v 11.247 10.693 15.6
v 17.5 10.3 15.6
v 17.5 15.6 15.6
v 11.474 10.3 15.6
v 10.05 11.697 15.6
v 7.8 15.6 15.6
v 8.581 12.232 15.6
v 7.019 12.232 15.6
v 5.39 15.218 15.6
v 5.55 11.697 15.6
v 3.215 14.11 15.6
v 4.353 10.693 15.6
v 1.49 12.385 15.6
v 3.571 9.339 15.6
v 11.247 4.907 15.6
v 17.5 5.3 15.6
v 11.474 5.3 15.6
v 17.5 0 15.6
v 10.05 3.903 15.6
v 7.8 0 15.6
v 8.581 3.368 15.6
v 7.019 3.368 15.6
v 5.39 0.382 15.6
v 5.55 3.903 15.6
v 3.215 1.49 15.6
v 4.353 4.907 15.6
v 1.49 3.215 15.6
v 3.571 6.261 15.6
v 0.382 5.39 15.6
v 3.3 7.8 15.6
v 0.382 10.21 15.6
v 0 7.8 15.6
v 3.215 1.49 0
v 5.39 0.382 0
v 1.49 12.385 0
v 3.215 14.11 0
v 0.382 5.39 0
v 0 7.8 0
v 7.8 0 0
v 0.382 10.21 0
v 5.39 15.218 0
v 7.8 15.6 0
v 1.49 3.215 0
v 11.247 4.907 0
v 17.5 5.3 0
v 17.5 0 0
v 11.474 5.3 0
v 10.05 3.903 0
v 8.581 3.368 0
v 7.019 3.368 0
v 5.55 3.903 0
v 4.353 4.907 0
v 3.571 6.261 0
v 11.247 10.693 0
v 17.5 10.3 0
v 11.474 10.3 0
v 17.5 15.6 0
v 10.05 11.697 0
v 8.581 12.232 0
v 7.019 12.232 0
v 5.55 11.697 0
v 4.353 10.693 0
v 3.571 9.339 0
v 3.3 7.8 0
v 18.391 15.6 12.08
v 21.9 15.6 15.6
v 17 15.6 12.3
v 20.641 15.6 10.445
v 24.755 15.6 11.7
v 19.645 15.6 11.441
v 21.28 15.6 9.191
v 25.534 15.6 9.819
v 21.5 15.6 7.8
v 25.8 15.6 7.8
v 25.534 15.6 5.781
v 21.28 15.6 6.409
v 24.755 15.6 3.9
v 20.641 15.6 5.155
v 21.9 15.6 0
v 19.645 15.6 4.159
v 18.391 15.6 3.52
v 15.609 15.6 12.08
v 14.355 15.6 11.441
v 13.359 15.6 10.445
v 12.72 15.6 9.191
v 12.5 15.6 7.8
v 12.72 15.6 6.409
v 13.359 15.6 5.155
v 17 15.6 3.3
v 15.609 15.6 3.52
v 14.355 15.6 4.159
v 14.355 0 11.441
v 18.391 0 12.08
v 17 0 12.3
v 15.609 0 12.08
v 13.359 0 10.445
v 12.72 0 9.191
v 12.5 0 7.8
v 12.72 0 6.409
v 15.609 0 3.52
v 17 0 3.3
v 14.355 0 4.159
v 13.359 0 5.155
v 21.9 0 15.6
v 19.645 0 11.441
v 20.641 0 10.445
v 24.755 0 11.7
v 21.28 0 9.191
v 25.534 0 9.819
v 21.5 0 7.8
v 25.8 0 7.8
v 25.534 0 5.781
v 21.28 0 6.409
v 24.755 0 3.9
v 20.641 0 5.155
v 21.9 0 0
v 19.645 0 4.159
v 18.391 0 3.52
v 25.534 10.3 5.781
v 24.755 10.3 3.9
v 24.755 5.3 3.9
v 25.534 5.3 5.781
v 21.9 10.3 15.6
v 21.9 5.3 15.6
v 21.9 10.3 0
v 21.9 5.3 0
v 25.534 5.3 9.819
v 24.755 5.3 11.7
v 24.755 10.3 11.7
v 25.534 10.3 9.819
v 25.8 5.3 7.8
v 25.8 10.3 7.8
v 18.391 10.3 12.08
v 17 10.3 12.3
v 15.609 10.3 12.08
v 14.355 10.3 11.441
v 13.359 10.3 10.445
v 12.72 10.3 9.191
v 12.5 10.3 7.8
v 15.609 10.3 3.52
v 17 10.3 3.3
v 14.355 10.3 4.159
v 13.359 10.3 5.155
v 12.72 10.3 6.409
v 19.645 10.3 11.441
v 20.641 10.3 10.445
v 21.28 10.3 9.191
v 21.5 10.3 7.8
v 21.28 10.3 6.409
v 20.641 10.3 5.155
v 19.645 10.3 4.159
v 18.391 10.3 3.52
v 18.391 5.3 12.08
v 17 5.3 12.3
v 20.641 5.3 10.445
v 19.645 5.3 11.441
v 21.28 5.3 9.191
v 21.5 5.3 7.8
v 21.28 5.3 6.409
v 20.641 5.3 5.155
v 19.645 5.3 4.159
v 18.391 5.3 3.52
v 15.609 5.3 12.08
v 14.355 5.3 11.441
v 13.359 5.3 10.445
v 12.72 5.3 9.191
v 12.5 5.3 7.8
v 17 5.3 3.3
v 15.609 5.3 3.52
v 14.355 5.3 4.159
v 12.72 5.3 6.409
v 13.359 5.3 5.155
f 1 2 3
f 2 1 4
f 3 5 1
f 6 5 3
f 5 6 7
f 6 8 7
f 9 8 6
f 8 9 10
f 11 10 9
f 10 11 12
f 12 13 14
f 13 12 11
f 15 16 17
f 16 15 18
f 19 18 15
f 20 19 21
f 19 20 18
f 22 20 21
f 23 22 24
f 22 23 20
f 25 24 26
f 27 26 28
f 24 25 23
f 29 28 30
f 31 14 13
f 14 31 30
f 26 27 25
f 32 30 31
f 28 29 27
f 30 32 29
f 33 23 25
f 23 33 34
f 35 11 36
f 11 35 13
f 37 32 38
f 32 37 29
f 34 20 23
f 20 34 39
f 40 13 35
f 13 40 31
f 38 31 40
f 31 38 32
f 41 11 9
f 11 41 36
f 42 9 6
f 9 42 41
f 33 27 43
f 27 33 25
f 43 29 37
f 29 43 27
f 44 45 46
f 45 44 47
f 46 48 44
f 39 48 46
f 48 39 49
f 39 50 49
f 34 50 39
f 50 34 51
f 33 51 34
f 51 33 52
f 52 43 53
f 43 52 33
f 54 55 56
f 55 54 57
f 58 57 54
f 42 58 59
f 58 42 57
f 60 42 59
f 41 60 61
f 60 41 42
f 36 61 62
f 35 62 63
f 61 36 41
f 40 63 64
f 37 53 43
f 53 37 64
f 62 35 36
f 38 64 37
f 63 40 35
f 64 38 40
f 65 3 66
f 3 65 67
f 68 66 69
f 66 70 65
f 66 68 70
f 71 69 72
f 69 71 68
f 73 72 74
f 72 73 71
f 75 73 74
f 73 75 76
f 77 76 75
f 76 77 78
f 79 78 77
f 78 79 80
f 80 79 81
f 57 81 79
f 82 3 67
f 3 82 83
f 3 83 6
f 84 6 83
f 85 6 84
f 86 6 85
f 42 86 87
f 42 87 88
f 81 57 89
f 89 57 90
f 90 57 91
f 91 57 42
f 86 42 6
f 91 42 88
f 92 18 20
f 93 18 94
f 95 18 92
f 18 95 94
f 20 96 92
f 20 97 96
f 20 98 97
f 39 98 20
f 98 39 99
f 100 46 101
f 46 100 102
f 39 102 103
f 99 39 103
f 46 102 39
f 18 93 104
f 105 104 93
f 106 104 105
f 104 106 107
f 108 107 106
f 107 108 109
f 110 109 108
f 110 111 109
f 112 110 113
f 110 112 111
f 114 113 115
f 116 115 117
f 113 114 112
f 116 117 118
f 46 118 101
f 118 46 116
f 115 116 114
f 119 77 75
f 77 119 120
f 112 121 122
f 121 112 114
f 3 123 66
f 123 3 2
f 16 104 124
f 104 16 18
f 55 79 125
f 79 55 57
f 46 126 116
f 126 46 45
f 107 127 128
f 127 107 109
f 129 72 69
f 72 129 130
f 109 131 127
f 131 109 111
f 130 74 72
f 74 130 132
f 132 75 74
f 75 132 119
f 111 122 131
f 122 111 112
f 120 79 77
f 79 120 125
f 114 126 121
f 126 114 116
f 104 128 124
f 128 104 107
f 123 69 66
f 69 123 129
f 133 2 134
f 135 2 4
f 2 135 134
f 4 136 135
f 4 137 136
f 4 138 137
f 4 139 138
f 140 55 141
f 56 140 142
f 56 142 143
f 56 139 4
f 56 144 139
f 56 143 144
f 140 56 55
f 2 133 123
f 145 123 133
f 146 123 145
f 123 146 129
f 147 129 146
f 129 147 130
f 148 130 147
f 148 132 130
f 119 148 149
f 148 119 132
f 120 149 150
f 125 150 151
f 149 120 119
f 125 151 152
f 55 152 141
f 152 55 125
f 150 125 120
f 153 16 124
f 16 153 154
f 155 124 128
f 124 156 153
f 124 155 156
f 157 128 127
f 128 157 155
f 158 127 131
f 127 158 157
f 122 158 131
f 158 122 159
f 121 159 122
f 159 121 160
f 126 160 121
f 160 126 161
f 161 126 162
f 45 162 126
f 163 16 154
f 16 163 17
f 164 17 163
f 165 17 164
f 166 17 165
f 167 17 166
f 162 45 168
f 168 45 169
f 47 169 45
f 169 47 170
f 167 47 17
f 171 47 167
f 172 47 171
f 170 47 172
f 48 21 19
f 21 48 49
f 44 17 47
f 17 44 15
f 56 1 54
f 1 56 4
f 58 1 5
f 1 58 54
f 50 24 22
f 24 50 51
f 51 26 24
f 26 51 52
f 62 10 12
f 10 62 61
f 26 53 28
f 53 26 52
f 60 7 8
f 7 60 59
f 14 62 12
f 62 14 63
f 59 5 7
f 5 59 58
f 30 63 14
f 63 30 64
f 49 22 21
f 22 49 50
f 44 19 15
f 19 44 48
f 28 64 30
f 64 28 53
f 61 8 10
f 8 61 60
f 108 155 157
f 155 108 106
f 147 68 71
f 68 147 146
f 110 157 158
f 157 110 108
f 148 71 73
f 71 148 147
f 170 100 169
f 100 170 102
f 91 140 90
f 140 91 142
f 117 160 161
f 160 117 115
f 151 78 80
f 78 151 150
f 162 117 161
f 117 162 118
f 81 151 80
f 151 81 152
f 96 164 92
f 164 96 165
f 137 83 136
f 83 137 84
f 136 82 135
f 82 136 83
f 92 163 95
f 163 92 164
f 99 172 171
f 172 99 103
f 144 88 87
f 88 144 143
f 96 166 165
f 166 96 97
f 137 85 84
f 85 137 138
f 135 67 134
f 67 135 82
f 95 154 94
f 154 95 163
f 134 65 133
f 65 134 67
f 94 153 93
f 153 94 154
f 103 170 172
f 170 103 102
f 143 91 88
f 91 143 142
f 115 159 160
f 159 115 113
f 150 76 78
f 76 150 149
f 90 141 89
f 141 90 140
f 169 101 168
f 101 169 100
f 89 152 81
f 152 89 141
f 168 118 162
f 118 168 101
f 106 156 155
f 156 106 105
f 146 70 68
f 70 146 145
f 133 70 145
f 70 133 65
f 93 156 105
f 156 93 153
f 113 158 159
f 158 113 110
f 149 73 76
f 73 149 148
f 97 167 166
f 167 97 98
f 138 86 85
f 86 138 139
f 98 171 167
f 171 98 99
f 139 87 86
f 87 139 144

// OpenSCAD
// file: functions.scad
// PRUSA Mendel  
// Functions used in many files
// GNU GPL v3
// Josef Průša
// josefprusa@me.com
// prusadjs.cz
// http://www.reprap.org/wiki/Prusa_Mendel
// http://github.com/prusajr/PrusaMendel


module nut(d,h,horizontal=true){
cornerdiameter =  (d / 2) / cos (180 / 6);
cylinder(h = h, r = cornerdiameter, $fn = 6);
if(horizontal){
for(i = [1:6]){
	rotate([0,0,60*i]) translate([-cornerdiameter-0.2,0,0]) rotate([0,0,-45]) cube(size = [2,2,h]);
}}
}

// Based on nophead research
module polyhole(d,h) {
    n = max(round(2 * d),3);
    rotate([0,0,180])
        cylinder(h = h, r = (d / 2) / cos (180 / n), $fn = n);
}




module roundcorner(diameter){
	difference(){
		cube(size = [diameter,diameter,99], center = false);
		translate(v = [diameter, diameter, 0]) cylinder(h = 100, r=diameter, center=true);
	}
}
// file: metric.scad
// PRUSA Mendel  
// Default metric sizes
// GNU GPL v3
// Josef Průša
// josefprusa@me.com
// prusadjs.cz
// http://www.reprap.org/wiki/Prusa_Mendel
// http://github.com/prusajr/PrusaMendel

// DONT CHANGE THIS FILE! ALTER VALUES IN CONFIGURATION.SCAD INSTEAD

// RODS

threaded_rod_diameter = 8.7;
threaded_rod_diameter_horizontal = 8.7;
smooth_bar_diameter = 8;
smooth_bar_diameter_horizontal = 8.5;

// Nuts and bolts

m8_diameter = 9;
m8_nut_diameter = 14.1;

m4_diameter = 4.5;
m4_nut_diameter = 9;

m3_diameter = 3.6;
m3_nut_diameter = 5.3;
m3_nut_diameter_horizontal = 6.1;

// Bushing holder

bushing_core_diameter = smooth_bar_diameter;
bushing_material_thickness = 1;

// Motors

motor_shaft = 5.5;
// file: teardrop.scad
teardrop();

module teardrop (r=4.5,h=20,top_and_bottom=false)
{
	rotate([-270,0,90])
	linear_extrude(height=h,convexity=10)
	{
		circle(r=r, $fn = 24);
		polygon(points=[[0,0],[r*cos(30),r*sin(30)],[0.5*r,r],[-0.5*r,r],[-r*cos(30),r*sin(30)]],
				paths=[[0,1,2,3,4]]);
		if (top_and_bottom)
		polygon(points=[[0,0],[r*cos(30),-r*sin(30)],[0.5*r,-r],[-0.5*r,-r],[-r*cos(30),-r*sin(30)]],
				paths=[[0,1,2,3,4]]);
		
	}
}

module teardropcentering (r=4.5,h=20)
{
	rotate([-270,0,90])
	linear_extrude(height=h)
	{
		circle(r=r, $fn = 24);
		polygon(points=[[0,0],[r*cos(30),r*sin(30)],[0.5*r,1.2*r],[-0.5*r,1.2*r],[-r*cos(30),r*sin(30)]],
				paths=[[0,1,2,3,4]]);
	}
}

module teardropcentering2 (r=4.5,h=20)
{
	//rotate([-270,0,90])
	difference(){
	linear_extrude(height=h)
	{
		circle(r=r, $fn = 24);
		polygon(points=[[0,0],[r*cos(30),r*sin(30)],[0.5*r,1.2*r],[-0.5*r,1.2*r],[-r*cos(30),r*sin(30)]],
				paths=[[0,1,2,3,4]]);
	}
	translate(v = [-1.5*r, -1.5*r,-1])cube(size =[3*r,1.5*r,h+2]);
	}
}
// file: configuration.scad
// PRUSA Mendel  
// Configuration file
// GNU GPL v3
// Josef Průša
// josefprusa@me.com
// prusadjs.cz
// http://www.reprap.org/wiki/Prusa_Mendel
// http://github.com/prusajr/PrusaMendel

// PLEASE SELECT ONE OF THE CONFIGURATIONS BELOW
// BY UN-COMMENTING IT

// Uncomment for metric settings
// METRIC METRIC METRIC METRIC METRIC METRIC METRIC METRIC 

include <metric.scad>;

// CUSTOM CUSTOM CUSTOM CUSTOM CUSTOM CUSTOM CUSTOM CUSTOM CUSTOM

thin_wall = 3;


// Linear bearing version
linear = false;
// set false for LM-8UU, true for LM-E-8UU (ignore if linear is set to false)
lme8uu = false;



// CHANGE ONLY THE STUFF YOU KNOW
// IT WILL REPLACE DEFAULT SETTING

// RODS

// threaded_rod_diameter = 0;
// threaded_rod_diameter_horizontal = 0;
// smooth_bar_diameter = 0;
// smooth_bar_diameter_horizontal = 0;

// Nuts and bolts

// m8_diameter = 0;
// m8_nut_diameter = 0;

// m4_diameter = 0;
// m4_nut_diameter = 0;

// m3_diameter = 0;
// m3_nut_diameter = 0;

// Bushing holder

// bushing_core_diameter = smooth_bar_diameter;
// bushing_material_thickness = 0;


///counted stuff
m3_nut_diameter_bigger = ((m3_nut_diameter  / 2) / cos (180 / 6))*2;

// functions 
include <functions.scad>
// main file
// PRUSA Mendel  
// Bar clamp
// Used for joining 8mm rods
// GNU GPL v2
// Josef Průša
// josefprusa@me.com
// prusadjs.cz
// http://www.reprap.org/wiki/Prusa_Mendel
// http://github.com/prusajr/PrusaMendel

include <configuration.scad>
use <teardrop.scad>

/**
 * @name Bar clamp
 * @category Printed
 * @using 2 m8nut
 * @using 2 m8washer
 */ 

module barclamp()
{
	outer_radius=m8_diameter/2+3.3;
	clamp_length=17.5;
	clamp_height=2*outer_radius;
	slot_width=5;

	difference()
	{
		union()
		{			
			translate([outer_radius, outer_radius, 0])
			cylinder(h=outer_radius*2,r=outer_radius, $fn = 20);

			translate([outer_radius, 0, 0])
			cube([clamp_length-outer_radius,outer_radius*2,clamp_height]);

			rotate(90)
			translate([0,-18,outer_radius])
			teardrop(r=outer_radius,h=clamp_height,top_and_bottom=true);
		}
	
		translate([outer_radius,outer_radius-slot_width/2,-1])
		cube([clamp_length+1,slot_width,clamp_height+2]);

		translate([outer_radius, outer_radius,-1]) 
		#cylinder(h=clamp_height+2,r=m8_diameter/2,$fn=18);

		translate([17,outer_radius*2+1,outer_radius]) rotate([90,0,0]) 
		#cylinder(h=outer_radius*2+2,r=m8_diameter/2,$fn=20);
	}
}

barclamp();
